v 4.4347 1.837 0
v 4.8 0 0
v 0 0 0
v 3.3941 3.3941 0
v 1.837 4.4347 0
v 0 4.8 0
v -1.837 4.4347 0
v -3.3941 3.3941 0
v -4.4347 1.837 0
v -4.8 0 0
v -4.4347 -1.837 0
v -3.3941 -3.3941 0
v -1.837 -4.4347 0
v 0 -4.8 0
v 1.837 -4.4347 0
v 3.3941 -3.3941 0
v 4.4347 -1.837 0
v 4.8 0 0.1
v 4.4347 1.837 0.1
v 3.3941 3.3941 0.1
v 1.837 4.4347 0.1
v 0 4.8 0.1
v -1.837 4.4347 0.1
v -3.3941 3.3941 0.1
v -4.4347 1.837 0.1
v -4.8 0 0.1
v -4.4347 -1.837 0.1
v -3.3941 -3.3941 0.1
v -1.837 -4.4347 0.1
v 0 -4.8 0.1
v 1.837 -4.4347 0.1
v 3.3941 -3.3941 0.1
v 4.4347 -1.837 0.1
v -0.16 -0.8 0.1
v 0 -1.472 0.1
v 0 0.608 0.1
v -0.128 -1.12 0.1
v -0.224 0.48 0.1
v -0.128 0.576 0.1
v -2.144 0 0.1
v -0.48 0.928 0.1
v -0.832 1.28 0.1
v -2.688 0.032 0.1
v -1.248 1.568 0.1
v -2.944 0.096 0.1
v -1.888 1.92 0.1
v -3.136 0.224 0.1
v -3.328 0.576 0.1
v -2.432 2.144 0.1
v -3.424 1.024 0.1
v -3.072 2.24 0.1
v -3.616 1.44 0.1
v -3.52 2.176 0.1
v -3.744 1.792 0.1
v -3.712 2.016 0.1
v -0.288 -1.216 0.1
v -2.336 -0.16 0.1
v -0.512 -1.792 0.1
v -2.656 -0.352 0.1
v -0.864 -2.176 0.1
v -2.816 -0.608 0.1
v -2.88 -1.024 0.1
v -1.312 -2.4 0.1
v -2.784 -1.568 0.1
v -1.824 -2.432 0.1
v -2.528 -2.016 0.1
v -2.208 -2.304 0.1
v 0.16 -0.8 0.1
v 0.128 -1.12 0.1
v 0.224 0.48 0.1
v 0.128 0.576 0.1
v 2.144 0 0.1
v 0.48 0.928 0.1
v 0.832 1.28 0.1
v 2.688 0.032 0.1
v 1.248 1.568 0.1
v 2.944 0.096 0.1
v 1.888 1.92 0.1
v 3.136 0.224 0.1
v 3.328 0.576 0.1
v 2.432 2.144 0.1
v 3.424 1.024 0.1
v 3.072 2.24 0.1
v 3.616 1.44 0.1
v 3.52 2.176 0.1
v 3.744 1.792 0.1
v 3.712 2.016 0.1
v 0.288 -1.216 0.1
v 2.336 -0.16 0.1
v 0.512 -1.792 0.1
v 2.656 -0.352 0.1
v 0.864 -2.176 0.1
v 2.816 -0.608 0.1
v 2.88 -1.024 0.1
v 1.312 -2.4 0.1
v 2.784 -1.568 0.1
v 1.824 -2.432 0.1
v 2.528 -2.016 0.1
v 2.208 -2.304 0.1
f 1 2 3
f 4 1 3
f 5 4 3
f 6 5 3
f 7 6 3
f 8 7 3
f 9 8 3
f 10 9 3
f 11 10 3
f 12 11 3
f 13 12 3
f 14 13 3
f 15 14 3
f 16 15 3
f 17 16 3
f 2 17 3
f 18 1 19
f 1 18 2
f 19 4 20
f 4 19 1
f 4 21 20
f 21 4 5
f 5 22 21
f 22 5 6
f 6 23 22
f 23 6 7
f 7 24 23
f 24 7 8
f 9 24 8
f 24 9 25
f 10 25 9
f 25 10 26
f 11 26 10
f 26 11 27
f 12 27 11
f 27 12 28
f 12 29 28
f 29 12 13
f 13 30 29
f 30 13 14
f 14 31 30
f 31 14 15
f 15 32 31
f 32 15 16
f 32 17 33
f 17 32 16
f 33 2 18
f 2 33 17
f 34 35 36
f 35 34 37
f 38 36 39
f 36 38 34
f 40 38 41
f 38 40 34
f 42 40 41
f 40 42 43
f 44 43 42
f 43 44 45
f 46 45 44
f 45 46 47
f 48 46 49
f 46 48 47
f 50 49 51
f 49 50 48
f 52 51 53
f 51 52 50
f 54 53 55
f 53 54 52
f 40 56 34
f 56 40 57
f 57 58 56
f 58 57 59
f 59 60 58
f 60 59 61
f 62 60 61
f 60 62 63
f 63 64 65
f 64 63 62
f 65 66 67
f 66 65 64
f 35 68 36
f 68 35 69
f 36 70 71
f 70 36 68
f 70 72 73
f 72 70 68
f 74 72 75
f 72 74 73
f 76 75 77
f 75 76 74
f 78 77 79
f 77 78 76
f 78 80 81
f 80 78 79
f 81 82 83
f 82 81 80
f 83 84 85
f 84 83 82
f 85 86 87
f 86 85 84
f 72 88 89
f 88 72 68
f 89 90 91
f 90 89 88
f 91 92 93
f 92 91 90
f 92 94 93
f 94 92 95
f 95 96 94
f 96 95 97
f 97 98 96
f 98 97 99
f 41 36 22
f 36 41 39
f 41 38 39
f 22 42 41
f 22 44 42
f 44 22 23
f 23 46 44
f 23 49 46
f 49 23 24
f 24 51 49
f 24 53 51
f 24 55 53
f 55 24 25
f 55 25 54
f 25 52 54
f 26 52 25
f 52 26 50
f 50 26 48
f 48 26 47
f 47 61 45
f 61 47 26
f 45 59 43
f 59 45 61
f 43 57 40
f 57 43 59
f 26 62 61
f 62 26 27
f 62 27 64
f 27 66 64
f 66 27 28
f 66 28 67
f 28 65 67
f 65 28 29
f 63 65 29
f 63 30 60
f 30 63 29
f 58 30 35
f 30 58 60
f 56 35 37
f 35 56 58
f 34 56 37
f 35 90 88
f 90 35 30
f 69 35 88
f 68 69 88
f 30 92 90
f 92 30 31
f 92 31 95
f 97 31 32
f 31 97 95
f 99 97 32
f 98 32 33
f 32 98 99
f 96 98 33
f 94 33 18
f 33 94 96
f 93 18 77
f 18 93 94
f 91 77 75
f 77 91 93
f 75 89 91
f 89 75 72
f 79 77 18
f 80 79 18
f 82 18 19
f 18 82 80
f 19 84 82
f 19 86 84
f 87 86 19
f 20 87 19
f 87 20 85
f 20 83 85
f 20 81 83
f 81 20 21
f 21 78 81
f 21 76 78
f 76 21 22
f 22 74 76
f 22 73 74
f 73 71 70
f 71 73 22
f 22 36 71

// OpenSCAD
// file: ../p/empty.scad
use <../lib.scad>
function ldraw_lib__empty() = [
// 0 Empty
// 0 Name: empty.dat
// 0 Author: Steffen [Steffen]
// 0 !LDRAW_ORG Primitive UPDATE 2015-01
// 0 !LICENSE Licensed under CC BY 4.0 : see CAreadme.txt
// 
// 0 BFC CERTIFY CCW
  [0,"BFC","CERTIFY"],
  [0,"BFC","CCW"],
// 
// 0 !HISTORY 2015-10-11 [PTadmin] Official Update 2015-01
// 
// 
// 0 // Tool MLCad cannot handle really empty files. This file is used as a workaround.
// 0 // It exceptionally contains forbidden non-LDRAW standard syntax to satisfy MLCad until it is fixed OR a different editor has become the de-facto LDRAW standard.
// 0 // The line being used here is an "impossible" conditional line which never should be visible,
// 0 // additionally hidden by a syntax explicitly hiding it from displaying.
// 
// 0 MLCAD HIDE 5 24 0 0 0 0.0001 0 0 0.0001 -0.0001 0 0 0 0
];
module ldraw_lib__empty(step=0, col=false, unit=2/5, alt=false, line=0.2, solid=!$preview)
    makepoly(ldraw_lib__empty(), step=step, col=col, unit=unit, alt=alt, line=line, solid=solid);
ldraw_lib__empty(line=0.2);
// file: ../p/1-16chrd.scad
use <../lib.scad>
use <empty.scad>
function ldraw_lib__1_16chrd() = [
// 0 Chord 0.0625
// 0 Name: 1-16chrd.dat
// 0 Author: Philippe Hurbain [Philo]
// 0 !LDRAW_ORG Primitive UPDATE 2015-01
// 0 !LICENSE Licensed under CC BY 4.0 : see CAreadme.txt
// 
// 0 BFC CERTIFY CCW
  [0,"BFC","CERTIFY"],
  [0,"BFC","CCW"],
// 
// 0 !HISTORY 2015-10-11 [PTadmin] Official Update 2015-01
// 
// 
// 0 // This file is intentionally empty because at the current \P resolution,
// 0 // an 1-16chrd is actually empty. However, this file still is present
// 0 // to allow tools to do primitives substition and fill in a real chrd here,
// 0 // or, if desired, to substitute this with the hi-res 48\1-16chrd.
// 
// 0 // This file is based on an idea by Darats at http://forums.ldraw.org/read.php?19,14500,14500#msg-14500
// 
// 1 16 0 0 0 1 0 0 0 1 0 0 0 1 empty.dat
  [1,16,0,0,0,1,0,0,0,1,0,0,0,1, ldraw_lib__empty()],
];
module ldraw_lib__1_16chrd(step=0, col=false, unit=2/5, alt=false, line=0.2, solid=!$preview)
    makepoly(ldraw_lib__1_16chrd(), step=step, col=col, unit=unit, alt=alt, line=line, solid=solid);
ldraw_lib__1_16chrd(line=0.2);
// file: ../p/4-4ering.scad
use <../lib.scad>
use <1-16chrd.scad>
function ldraw_lib__4_4ering() = [
// 0 Adapter Ring Triangles to Normal 1.0
// 0 Name: 4-4ering.dat
// 0 Author: Philippe Hurbain [Philo]
// 0 !LDRAW_ORG Primitive UPDATE 2015-01
// 0 !LICENSE Licensed under CC BY 4.0 : see CAreadme.txt
// 
// 0 BFC CERTIFY CCW
  [0,"BFC","CERTIFY"],
  [0,"BFC","CCW"],
// 
// 0 !HISTORY 2015-10-11 [PTadmin] Official Update 2015-01
// 
// 
// 0 // This file uses 1-16chrd (actually empty). It allows
// 0 // tools to do primitives substition and fill in a ring of chrd here,
// 0 // or, if desired, to substitute this with the hi-res 48\1-16chrd.
// 0 // This file is based on an idea by Darats at http://forums.ldraw.org/read.php?19,14500,14500#msg-14500
// 
// 1 16 0 0 0 1 0 0 0 1 0 0 0 1 1-16chrd.dat
  [1,16,0,0,0,1,0,0,0,1,0,0,0,1, ldraw_lib__1_16chrd()],
// 1 16 0 0 0 0.92388 0 0.38268 0 1 0 -0.38268 0 0.92388 1-16chrd.dat
  [1,16,0,0,0,0.92388,0,0.38268,0,1,0,-0.38268,0,0.92388, ldraw_lib__1_16chrd()],
// 1 16 0 0 0 0.70711 0 0.70711 0 1 0 -0.70711 0 0.70711 1-16chrd.dat
  [1,16,0,0,0,0.70711,0,0.70711,0,1,0,-0.70711,0,0.70711, ldraw_lib__1_16chrd()],
// 1 16 0 0 0 0.38268 0 0.92388 0 1 0 -0.92388 0 0.38268 1-16chrd.dat
  [1,16,0,0,0,0.38268,0,0.92388,0,1,0,-0.92388,0,0.38268, ldraw_lib__1_16chrd()],
// 1 16 0 0 0 0 0 1 0 1 0 -1 0 0 1-16chrd.dat
  [1,16,0,0,0,0,0,1,0,1,0,-1,0,0, ldraw_lib__1_16chrd()],
// 1 16 0 0 0 -0.38268 0 0.92388 0 1 0 -0.92388 0 -0.38268 1-16chrd.dat
  [1,16,0,0,0,-0.38268,0,0.92388,0,1,0,-0.92388,0,-0.38268, ldraw_lib__1_16chrd()],
// 1 16 0 0 0 -0.70711 0 0.70711 0 1 0 -0.70711 0 -0.70711 1-16chrd.dat
  [1,16,0,0,0,-0.70711,0,0.70711,0,1,0,-0.70711,0,-0.70711, ldraw_lib__1_16chrd()],
// 1 16 0 0 0 -0.92388 0 0.38268 0 1 0 -0.38268 0 -0.92388 1-16chrd.dat
  [1,16,0,0,0,-0.92388,0,0.38268,0,1,0,-0.38268,0,-0.92388, ldraw_lib__1_16chrd()],
// 1 16 0 0 0 0 0 -1 0 1 0 1 0 0 1-16chrd.dat
  [1,16,0,0,0,0,0,-1,0,1,0,1,0,0, ldraw_lib__1_16chrd()],
// 1 16 0 0 0 0.38268 0 -0.92388 0 1 0 0.92388 0 0.38268 1-16chrd.dat
  [1,16,0,0,0,0.38268,0,-0.92388,0,1,0,0.92388,0,0.38268, ldraw_lib__1_16chrd()],
// 1 16 0 0 0 0.70711 0 -0.70711 0 1 0 0.70711 0 0.70711 1-16chrd.dat
  [1,16,0,0,0,0.70711,0,-0.70711,0,1,0,0.70711,0,0.70711, ldraw_lib__1_16chrd()],
// 1 16 0 0 0 0.92388 0 -0.38268 0 1 0 0.38268 0 0.92388 1-16chrd.dat
  [1,16,0,0,0,0.92388,0,-0.38268,0,1,0,0.38268,0,0.92388, ldraw_lib__1_16chrd()],
// 1 16 0 0 0 -1 0 0 0 1 0 0 0 -1 1-16chrd.dat
  [1,16,0,0,0,-1,0,0,0,1,0,0,0,-1, ldraw_lib__1_16chrd()],
// 1 16 0 0 0 -0.92388 0 -0.38268 0 1 0 0.38268 0 -0.92388 1-16chrd.dat
  [1,16,0,0,0,-0.92388,0,-0.38268,0,1,0,0.38268,0,-0.92388, ldraw_lib__1_16chrd()],
// 1 16 0 0 0 -0.70711 0 -0.70711 0 1 0 0.70711 0 -0.70711 1-16chrd.dat
  [1,16,0,0,0,-0.70711,0,-0.70711,0,1,0,0.70711,0,-0.70711, ldraw_lib__1_16chrd()],
// 1 16 0 0 0 -0.38268 0 -0.92388 0 1 0 0.92388 0 -0.38268 1-16chrd.dat
  [1,16,0,0,0,-0.38268,0,-0.92388,0,1,0,0.92388,0,-0.38268, ldraw_lib__1_16chrd()],
];
module ldraw_lib__4_4ering(step=0, col=false, unit=2/5, alt=false, line=0.2, solid=!$preview)
    makepoly(ldraw_lib__4_4ering(), step=step, col=col, unit=unit, alt=alt, line=line, solid=solid);
ldraw_lib__4_4ering(line=0.2);
// file: ../p/4-4disc.scad
use <../lib.scad>
function ldraw_lib__4_4disc() = [
// 0 Disc 1.0
// 0 Name: 4-4disc.dat
// 0 Author: James Jessiman
// 0 !LDRAW_ORG Primitive UPDATE 2002-02
// 0 !LICENSE Licensed under CC BY 4.0 : see CAreadme.txt
// 
// 0 BFC CERTIFY CCW
  [0,"BFC","CERTIFY"],
  [0,"BFC","CCW"],
// 
// 0 !HISTORY 1998-12-15 [PTadmin] Official Update 1998-10
// 0 !HISTORY 2002-03-23 [sbliss] Added BFC statement
// 0 !HISTORY 2002-04-25 [PTadmin] Official Update 2002-02
// 0 !HISTORY 2007-06-24 [PTadmin] Header formatted for Contributor Agreement
// 0 !HISTORY 2008-07-01 [PTadmin] Official Update 2008-01
// 
// 
// 3 16 0 0 0 1 0 0 0.9239 0 0.3827
  [3,16,0,0,0,1,0,0,0.9239,0,0.3827],
// 3 16 0 0 0 0.9239 0 0.3827 0.7071 0 0.7071
  [3,16,0,0,0,0.9239,0,0.3827,0.7071,0,0.7071],
// 3 16 0 0 0 0.7071 0 0.7071 0.3827 0 0.9239
  [3,16,0,0,0,0.7071,0,0.7071,0.3827,0,0.9239],
// 3 16 0 0 0 0.3827 0 0.9239 0 0 1
  [3,16,0,0,0,0.3827,0,0.9239,0,0,1],
// 3 16 0 0 0 0 0 1 -0.3827 0 0.9239
  [3,16,0,0,0,0,0,1,-0.3827,0,0.9239],
// 3 16 0 0 0 -0.3827 0 0.9239 -0.7071 0 0.7071
  [3,16,0,0,0,-0.3827,0,0.9239,-0.7071,0,0.7071],
// 3 16 0 0 0 -0.7071 0 0.7071 -0.9239 0 0.3827
  [3,16,0,0,0,-0.7071,0,0.7071,-0.9239,0,0.3827],
// 3 16 0 0 0 -0.9239 0 0.3827 -1 0 -0
  [3,16,0,0,0,-0.9239,0,0.3827,-1,0,-0],
// 3 16 0 0 0 -1 0 -0 -0.9239 0 -0.3827
  [3,16,0,0,0,-1,0,-0,-0.9239,0,-0.3827],
// 3 16 0 0 0 -0.9239 0 -0.3827 -0.7071 0 -0.7071
  [3,16,0,0,0,-0.9239,0,-0.3827,-0.7071,0,-0.7071],
// 3 16 0 0 0 -0.7071 0 -0.7071 -0.3827 0 -0.9239
  [3,16,0,0,0,-0.7071,0,-0.7071,-0.3827,0,-0.9239],
// 3 16 0 0 0 -0.3827 0 -0.9239 0 0 -1
  [3,16,0,0,0,-0.3827,0,-0.9239,0,0,-1],
// 3 16 0 0 0 0 0 -1 0.3827 0 -0.9239
  [3,16,0,0,0,0,0,-1,0.3827,0,-0.9239],
// 3 16 0 0 0 0.3827 0 -0.9239 0.7071 0 -0.7071
  [3,16,0,0,0,0.3827,0,-0.9239,0.7071,0,-0.7071],
// 3 16 0 0 0 0.7071 0 -0.7071 0.9239 0 -0.3827
  [3,16,0,0,0,0.7071,0,-0.7071,0.9239,0,-0.3827],
// 3 16 0 0 0 0.9239 0 -0.3827 1 0 0
  [3,16,0,0,0,0.9239,0,-0.3827,1,0,0],
// 0
];
module ldraw_lib__4_4disc(step=0, col=false, unit=2/5, alt=false, line=0.2, solid=!$preview)
    makepoly(ldraw_lib__4_4disc(), step=step, col=col, unit=unit, alt=alt, line=line, solid=solid);
ldraw_lib__4_4disc(line=0.2);
// file: ../p/4-4cyli.scad
use <../lib.scad>
function ldraw_lib__4_4cyli() = [
// 0 Cylinder 1.0
// 0 Name: 4-4cyli.dat
// 0 Author: James Jessiman
// 0 !LDRAW_ORG Primitive UPDATE 2005-01
// 0 !LICENSE Licensed under CC BY 4.0 : see CAreadme.txt
// 
// 0 BFC CERTIFY CCW
  [0,"BFC","CERTIFY"],
  [0,"BFC","CCW"],
// 
// 0 !HISTORY 1998-12-15 [PTadmin] Official Update 1998-10
// 0 !HISTORY 2002-03-23 [sbliss] Added BFC statement; merged headers from files in distributions LDraw 0.27 and Complete.
// 0 !HISTORY 2002-04-25 [PTadmin] Official Update 2002-02
// 0 !HISTORY 2004-12-14 [guyvivan] BFC CCW
// 0 !HISTORY 2005-12-28 [PTadmin] Official Update 2005-01
// 0 !HISTORY 2007-06-24 [PTadmin] Header formatted for Contributor Agreement
// 0 !HISTORY 2008-07-01 [PTadmin] Official Update 2008-01
// 
// 
// 4 16 1 1 0 0.9239 1 0.3827 0.9239 0 0.3827 1 0 0
  [4,16,1,1,0,0.9239,1,0.3827,0.9239,0,0.3827,1,0,0],
// 5 24 1 0 0 1 1 0 0.9239 0 0.3827 0.9239 0 -0.3827
  [5,24,1,0,0,1,1,0,0.9239,0,0.3827,0.9239,0,-0.3827],
// 4 16 0.9239 1 0.3827 0.7071 1 0.7071 0.7071 0 0.7071 0.9239 0 0.3827
  [4,16,0.9239,1,0.3827,0.7071,1,0.7071,0.7071,0,0.7071,0.9239,0,0.3827],
// 5 24 0.9239 0 0.3827 0.9239 1 0.3827 0.7071 0 0.7071 1 0 0
  [5,24,0.9239,0,0.3827,0.9239,1,0.3827,0.7071,0,0.7071,1,0,0],
// 4 16 0.7071 1 0.7071 0.3827 1 0.9239 0.3827 0 0.9239 0.7071 0 0.7071
  [4,16,0.7071,1,0.7071,0.3827,1,0.9239,0.3827,0,0.9239,0.7071,0,0.7071],
// 5 24 0.7071 0 0.7071 0.7071 1 0.7071 0.3827 0 0.9239 0.9239 0 0.3827
  [5,24,0.7071,0,0.7071,0.7071,1,0.7071,0.3827,0,0.9239,0.9239,0,0.3827],
// 4 16 0.3827 1 0.9239 0 1 1 0 0 1 0.3827 0 0.9239
  [4,16,0.3827,1,0.9239,0,1,1,0,0,1,0.3827,0,0.9239],
// 5 24 0.3827 0 0.9239 0.3827 1 0.9239 0 0 1 0.7071 0 0.7071
  [5,24,0.3827,0,0.9239,0.3827,1,0.9239,0,0,1,0.7071,0,0.7071],
// 4 16 0 1 1 -0.3827 1 0.9239 -0.3827 0 0.9239 0 0 1
  [4,16,0,1,1,-0.3827,1,0.9239,-0.3827,0,0.9239,0,0,1],
// 5 24 0 0 1 0 1 1 -0.3827 0 0.9239 0.3827 0 0.9239
  [5,24,0,0,1,0,1,1,-0.3827,0,0.9239,0.3827,0,0.9239],
// 4 16 -0.3827 1 0.9239 -0.7071 1 0.7071 -0.7071 0 0.7071 -0.3827 0 0.9239
  [4,16,-0.3827,1,0.9239,-0.7071,1,0.7071,-0.7071,0,0.7071,-0.3827,0,0.9239],
// 5 24 -0.3827 0 0.9239 -0.3827 1 0.9239 -0.7071 0 0.7071 0 0 1
  [5,24,-0.3827,0,0.9239,-0.3827,1,0.9239,-0.7071,0,0.7071,0,0,1],
// 4 16 -0.7071 1 0.7071 -0.9239 1 0.3827 -0.9239 0 0.3827 -0.7071 0 0.7071
  [4,16,-0.7071,1,0.7071,-0.9239,1,0.3827,-0.9239,0,0.3827,-0.7071,0,0.7071],
// 5 24 -0.7071 0 0.7071 -0.7071 1 0.7071 -0.9239 0 0.3827 -0.3827 0 0.9239
  [5,24,-0.7071,0,0.7071,-0.7071,1,0.7071,-0.9239,0,0.3827,-0.3827,0,0.9239],
// 4 16 -0.9239 1 0.3827 -1 1 0 -1 0 0 -0.9239 0 0.3827
  [4,16,-0.9239,1,0.3827,-1,1,0,-1,0,0,-0.9239,0,0.3827],
// 5 24 -0.9239 0 0.3827 -0.9239 1 0.3827 -1 0 0 -0.7071 0 0.7071
  [5,24,-0.9239,0,0.3827,-0.9239,1,0.3827,-1,0,0,-0.7071,0,0.7071],
// 4 16 -1 1 0 -0.9239 1 -0.3827 -0.9239 0 -0.3827 -1 0 0
  [4,16,-1,1,0,-0.9239,1,-0.3827,-0.9239,0,-0.3827,-1,0,0],
// 5 24 -1 0 0 -1 1 0 -0.9239 0 -0.3827 -0.9239 0 0.3827
  [5,24,-1,0,0,-1,1,0,-0.9239,0,-0.3827,-0.9239,0,0.3827],
// 4 16 -0.9239 1 -0.3827 -0.7071 1 -0.7071 -0.7071 0 -0.7071 -0.9239 0 -0.3827
  [4,16,-0.9239,1,-0.3827,-0.7071,1,-0.7071,-0.7071,0,-0.7071,-0.9239,0,-0.3827],
// 5 24 -0.9239 0 -0.3827 -0.9239 1 -0.3827 -0.7071 0 -0.7071 -1 0 0
  [5,24,-0.9239,0,-0.3827,-0.9239,1,-0.3827,-0.7071,0,-0.7071,-1,0,0],
// 4 16 -0.7071 1 -0.7071 -0.3827 1 -0.9239 -0.3827 0 -0.9239 -0.7071 0 -0.7071
  [4,16,-0.7071,1,-0.7071,-0.3827,1,-0.9239,-0.3827,0,-0.9239,-0.7071,0,-0.7071],
// 5 24 -0.7071 0 -0.7071 -0.7071 1 -0.7071 -0.3827 0 -0.9239 -0.9239 0 -0.3827
  [5,24,-0.7071,0,-0.7071,-0.7071,1,-0.7071,-0.3827,0,-0.9239,-0.9239,0,-0.3827],
// 4 16 -0.3827 1 -0.9239 0 1 -1 0 0 -1 -0.3827 0 -0.9239
  [4,16,-0.3827,1,-0.9239,0,1,-1,0,0,-1,-0.3827,0,-0.9239],
// 5 24 -0.3827 0 -0.9239 -0.3827 1 -0.9239 0 0 -1 -0.7071 0 -0.7071
  [5,24,-0.3827,0,-0.9239,-0.3827,1,-0.9239,0,0,-1,-0.7071,0,-0.7071],
// 4 16 0 1 -1 0.3827 1 -0.9239 0.3827 0 -0.9239 0 0 -1
  [4,16,0,1,-1,0.3827,1,-0.9239,0.3827,0,-0.9239,0,0,-1],
// 5 24 0 0 -1 0 1 -1 0.3827 0 -0.9239 -0.3827 0 -0.9239
  [5,24,0,0,-1,0,1,-1,0.3827,0,-0.9239,-0.3827,0,-0.9239],
// 4 16 0.3827 1 -0.9239 0.7071 1 -0.7071 0.7071 0 -0.7071 0.3827 0 -0.9239
  [4,16,0.3827,1,-0.9239,0.7071,1,-0.7071,0.7071,0,-0.7071,0.3827,0,-0.9239],
// 5 24 0.3827 0 -0.9239 0.3827 1 -0.9239 0.7071 0 -0.7071 0 0 -1
  [5,24,0.3827,0,-0.9239,0.3827,1,-0.9239,0.7071,0,-0.7071,0,0,-1],
// 4 16 0.7071 1 -0.7071 0.9239 1 -0.3827 0.9239 0 -0.3827 0.7071 0 -0.7071
  [4,16,0.7071,1,-0.7071,0.9239,1,-0.3827,0.9239,0,-0.3827,0.7071,0,-0.7071],
// 5 24 0.7071 0 -0.7071 0.7071 1 -0.7071 0.9239 0 -0.3827 0.3827 0 -0.9239
  [5,24,0.7071,0,-0.7071,0.7071,1,-0.7071,0.9239,0,-0.3827,0.3827,0,-0.9239],
// 4 16 0.9239 1 -0.3827 1 1 0 1 0 0 0.9239 0 -0.3827
  [4,16,0.9239,1,-0.3827,1,1,0,1,0,0,0.9239,0,-0.3827],
// 5 24 0.9239 0 -0.3827 0.9239 1 -0.3827 1 0 0 0.7071 0 -0.7071
  [5,24,0.9239,0,-0.3827,0.9239,1,-0.3827,1,0,0,0.7071,0,-0.7071],
// 0
];
module ldraw_lib__4_4cyli(step=0, col=false, unit=2/5, alt=false, line=0.2, solid=!$preview)
    makepoly(ldraw_lib__4_4cyli(), step=step, col=col, unit=unit, alt=alt, line=line, solid=solid);
ldraw_lib__4_4cyli(line=0.2);
// file: s/4650854is02.scad
use <../../lib.scad>
function ldraw_lib__s__4650854is02() = [
// 0 ~Sticker  0.9 x  1.3 with Butterfly - Shape
// 0 Name: s\4650854is02.dat
// 0 Author: Takeshi Takahashi [RainbowDolphin]
// 0 !LDRAW_ORG Subpart UPDATE 2024-04
// 0 !LICENSE Licensed under CC BY 4.0 : see CAreadme.txt
// 
// 0 BFC CERTIFY CCW
  [0,"BFC","CERTIFY"],
  [0,"BFC","CCW"],
// 
// 0 !HISTORY 2024-05-28 [OrionP] Official Update 2024-04
// 
// 
// 4 16 -.5 -.25 -2.5 -.4 -.25 -3.5 0 -.25 -4.6 0 -.25 1.9
  [4,16,-.5,-.25,-2.5,-.4,-.25,-3.5,0,-.25,-4.6,0,-.25,1.9],
// 4 16 -.5 -.25 -2.5 0 -.25 1.9 -.4 -.25 1.8 -.7 -.25 1.5
  [4,16,-.5,-.25,-2.5,0,-.25,1.9,-.4,-.25,1.8,-.7,-.25,1.5],
// 4 16 -6.7 -.25 0 -.5 -.25 -2.5 -.7 -.25 1.5 -1.5 -.25 2.9
  [4,16,-6.7,-.25,0,-.5,-.25,-2.5,-.7,-.25,1.5,-1.5,-.25,2.9],
// 4 16 -8.4 -.25 .1 -6.7 -.25 0 -1.5 -.25 2.9 -2.6 -.25 4
  [4,16,-8.4,-.25,.1,-6.7,-.25,0,-1.5,-.25,2.9,-2.6,-.25,4],
// 4 16 -9.2 -.25 .3 -8.4 -.25 .1 -2.6 -.25 4 -3.9 -.25 4.9
  [4,16,-9.2,-.25,.3,-8.4,-.25,.1,-2.6,-.25,4,-3.9,-.25,4.9],
// 4 16 -9.8 -.25 .7 -9.2 -.25 .3 -3.9 -.25 4.9 -5.9 -.25 6
  [4,16,-9.8,-.25,.7,-9.2,-.25,.3,-3.9,-.25,4.9,-5.9,-.25,6],
// 4 16 -10.4 -.25 1.8 -9.8 -.25 .7 -5.9 -.25 6 -7.6 -.25 6.7
  [4,16,-10.4,-.25,1.8,-9.8,-.25,.7,-5.9,-.25,6,-7.6,-.25,6.7],
// 4 16 -10.7 -.25 3.2 -10.4 -.25 1.8 -7.6 -.25 6.7 -9.6 -.25 7
  [4,16,-10.7,-.25,3.2,-10.4,-.25,1.8,-7.6,-.25,6.7,-9.6,-.25,7],
// 4 16 -11.3 -.25 4.5 -10.7 -.25 3.2 -9.6 -.25 7 -11 -.25 6.8
  [4,16,-11.3,-.25,4.5,-10.7,-.25,3.2,-9.6,-.25,7,-11,-.25,6.8],
// 4 16 -11.7 -.25 5.6 -11.3 -.25 4.5 -11 -.25 6.8 -11.6 -.25 6.3
  [4,16,-11.7,-.25,5.6,-11.3,-.25,4.5,-11,-.25,6.8,-11.6,-.25,6.3],
// 4 16 -.5 -.25 -2.5 -6.7 -.25 0 -7.3 -.25 -.5 -.9 -.25 -3.8
  [4,16,-.5,-.25,-2.5,-6.7,-.25,0,-7.3,-.25,-.5,-.9,-.25,-3.8],
// 4 16 -.9 -.25 -3.8 -7.3 -.25 -.5 -8.3 -.25 -1.1 -1.6 -.25 -5.6
  [4,16,-.9,-.25,-3.8,-7.3,-.25,-.5,-8.3,-.25,-1.1,-1.6,-.25,-5.6],
// 4 16 -1.6 -.25 -5.6 -8.3 -.25 -1.1 -8.8 -.25 -1.9 -2.7 -.25 -6.8
  [4,16,-1.6,-.25,-5.6,-8.3,-.25,-1.1,-8.8,-.25,-1.9,-2.7,-.25,-6.8],
// 4 16 -2.7 -.25 -6.8 -8.8 -.25 -1.9 -9 -.25 -3.2 -4.1 -.25 -7.5
  [4,16,-2.7,-.25,-6.8,-8.8,-.25,-1.9,-9,-.25,-3.2,-4.1,-.25,-7.5],
// 4 16 -4.1 -.25 -7.5 -9 -.25 -3.2 -8.7 -.25 -4.9 -5.7 -.25 -7.6
  [4,16,-4.1,-.25,-7.5,-9,-.25,-3.2,-8.7,-.25,-4.9,-5.7,-.25,-7.6],
// 4 16 -5.7 -.25 -7.6 -8.7 -.25 -4.9 -7.9 -.25 -6.3 -6.9 -.25 -7.2
  [4,16,-5.7,-.25,-7.6,-8.7,-.25,-4.9,-7.9,-.25,-6.3,-6.9,-.25,-7.2],
// 4 16 0 -.25 -4.6 .4 -.25 -3.5 .5 -.25 -2.5 0 -.25 1.9
  [4,16,0,-.25,-4.6,.4,-.25,-3.5,.5,-.25,-2.5,0,-.25,1.9],
// 4 16 .4 -.25 1.8 0 -.25 1.9 .5 -.25 -2.5 .7 -.25 1.5
  [4,16,.4,-.25,1.8,0,-.25,1.9,.5,-.25,-2.5,.7,-.25,1.5],
// 4 16 .7 -.25 1.5 .5 -.25 -2.5 6.7 -.25 0 1.5 -.25 2.9
  [4,16,.7,-.25,1.5,.5,-.25,-2.5,6.7,-.25,0,1.5,-.25,2.9],
// 4 16 1.5 -.25 2.9 6.7 -.25 0 8.4 -.25 .1 2.6 -.25 4
  [4,16,1.5,-.25,2.9,6.7,-.25,0,8.4,-.25,.1,2.6,-.25,4],
// 4 16 2.6 -.25 4 8.4 -.25 .1 9.2 -.25 .3 3.9 -.25 4.9
  [4,16,2.6,-.25,4,8.4,-.25,.1,9.2,-.25,.3,3.9,-.25,4.9],
// 4 16 3.9 -.25 4.9 9.2 -.25 .3 9.8 -.25 .7 5.9 -.25 6
  [4,16,3.9,-.25,4.9,9.2,-.25,.3,9.8,-.25,.7,5.9,-.25,6],
// 4 16 5.9 -.25 6 9.8 -.25 .7 10.4 -.25 1.8 7.6 -.25 6.7
  [4,16,5.9,-.25,6,9.8,-.25,.7,10.4,-.25,1.8,7.6,-.25,6.7],
// 4 16 7.6 -.25 6.7 10.4 -.25 1.8 10.7 -.25 3.2 9.6 -.25 7
  [4,16,7.6,-.25,6.7,10.4,-.25,1.8,10.7,-.25,3.2,9.6,-.25,7],
// 4 16 9.6 -.25 7 10.7 -.25 3.2 11.3 -.25 4.5 11 -.25 6.8
  [4,16,9.6,-.25,7,10.7,-.25,3.2,11.3,-.25,4.5,11,-.25,6.8],
// 4 16 11 -.25 6.8 11.3 -.25 4.5 11.7 -.25 5.6 11.6 -.25 6.3
  [4,16,11,-.25,6.8,11.3,-.25,4.5,11.7,-.25,5.6,11.6,-.25,6.3],
// 4 16 7.3 -.25 -.5 6.7 -.25 0 .5 -.25 -2.5 .9 -.25 -3.8
  [4,16,7.3,-.25,-.5,6.7,-.25,0,.5,-.25,-2.5,.9,-.25,-3.8],
// 4 16 8.3 -.25 -1.1 7.3 -.25 -.5 .9 -.25 -3.8 1.6 -.25 -5.6
  [4,16,8.3,-.25,-1.1,7.3,-.25,-.5,.9,-.25,-3.8,1.6,-.25,-5.6],
// 4 16 8.8 -.25 -1.9 8.3 -.25 -1.1 1.6 -.25 -5.6 2.7 -.25 -6.8
  [4,16,8.8,-.25,-1.9,8.3,-.25,-1.1,1.6,-.25,-5.6,2.7,-.25,-6.8],
// 4 16 9 -.25 -3.2 8.8 -.25 -1.9 2.7 -.25 -6.8 4.1 -.25 -7.5
  [4,16,9,-.25,-3.2,8.8,-.25,-1.9,2.7,-.25,-6.8,4.1,-.25,-7.5],
// 4 16 8.7 -.25 -4.9 9 -.25 -3.2 4.1 -.25 -7.5 5.7 -.25 -7.6
  [4,16,8.7,-.25,-4.9,9,-.25,-3.2,4.1,-.25,-7.5,5.7,-.25,-7.6],
// 4 16 7.9 -.25 -6.3 8.7 -.25 -4.9 5.7 -.25 -7.6 6.9 -.25 -7.2
  [4,16,7.9,-.25,-6.3,8.7,-.25,-4.9,5.7,-.25,-7.6,6.9,-.25,-7.2],
];
module ldraw_lib__s__4650854is02(step=0, col=false, unit=2/5, alt=false, line=0.2, solid=!$preview)
    makepoly(ldraw_lib__s__4650854is02(), step=step, col=col, unit=unit, alt=alt, line=line, solid=solid);
ldraw_lib__s__4650854is02(line=0.2);
// file: s/4620860as01.scad
use <../../lib.scad>
use <../../p/4-4ering.scad>
function ldraw_lib__s__4620860as01() = [
// 0 ~Sticker  1.2 x  1.2 Round with Butterfly - Background
// 0 Name: s\4620860as01.dat
// 0 Author: Takeshi Takahashi [RainbowDolphin]
// 0 !LDRAW_ORG Subpart UPDATE 2025-01
// 0 !LICENSE Licensed under CC BY 4.0 : see CAreadme.txt
// 
// 0 BFC CERTIFY CCW
  [0,"BFC","CERTIFY"],
  [0,"BFC","CCW"],
// 
// 0 !HISTORY 2025-01-20 [OrionP] Official Update 2025-01
// 
// 
// 1 16 0 -0.25 0 12 0 0 0 1 0 0 0 12 4-4ering.dat
  [1,16,0,-0.25,0,12,0,0,0,1,0,0,0,12, ldraw_lib__4_4ering()],
// 4 16 -.32 -.25 1.44 0 -.25 1.52 0 -.25 12 -1.2 -.25 2.32
  [4,16,-.32,-.25,1.44,0,-.25,1.52,0,-.25,12,-1.2,-.25,2.32],
// 3 16 -1.2 -.25 2.32 -.56 -.25 1.2 -.32 -.25 1.44
  [3,16,-1.2,-.25,2.32,-.56,-.25,1.2,-.32,-.25,1.44],
// 3 16 0 -.25 12 -2.08 -.25 3.2 -1.2 -.25 2.32
  [3,16,0,-.25,12,-2.08,-.25,3.2,-1.2,-.25,2.32],
// 4 16 -3.12 -.25 3.92 -2.08 -.25 3.2 0 -.25 12 -4.5924 -.25 11.0868
  [4,16,-3.12,-.25,3.92,-2.08,-.25,3.2,0,-.25,12,-4.5924,-.25,11.0868],
// 3 16 -4.5924 -.25 11.0868 -4.72 -.25 4.8 -3.12 -.25 3.92
  [3,16,-4.5924,-.25,11.0868,-4.72,-.25,4.8,-3.12,-.25,3.92],
// 4 16 -6.08 -.25 5.36 -4.72 -.25 4.8 -4.5924 -.25 11.0868 -8.4852 -.25 8.4852
  [4,16,-6.08,-.25,5.36,-4.72,-.25,4.8,-4.5924,-.25,11.0868,-8.4852,-.25,8.4852],
// 3 16 -8.4852 -.25 8.4852 -7.68 -.25 5.6 -6.08 -.25 5.36
  [3,16,-8.4852,-.25,8.4852,-7.68,-.25,5.6,-6.08,-.25,5.36],
// 3 16 -8.4852 -.25 8.4852 -8.8 -.25 5.44 -7.68 -.25 5.6
  [3,16,-8.4852,-.25,8.4852,-8.8,-.25,5.44,-7.68,-.25,5.6],
// 4 16 -9.28 -.25 5.04 -8.8 -.25 5.44 -8.4852 -.25 8.4852 -11.0868 -.25 4.5924
  [4,16,-9.28,-.25,5.04,-8.8,-.25,5.44,-8.4852,-.25,8.4852,-11.0868,-.25,4.5924],
// 3 16 -9.28 -.25 5.04 -11.0868 -.25 4.5924 -9.36 -.25 4.48
  [3,16,-9.28,-.25,5.04,-11.0868,-.25,4.5924,-9.36,-.25,4.48],
// 3 16 -11.0868 -.25 4.5924 -9.04 -.25 3.6 -9.36 -.25 4.48
  [3,16,-11.0868,-.25,4.5924,-9.04,-.25,3.6,-9.36,-.25,4.48],
// 4 16 -8.56 -.25 2.56 -9.04 -.25 3.6 -11.0868 -.25 4.5924 -12 -.25 0
  [4,16,-8.56,-.25,2.56,-9.04,-.25,3.6,-11.0868,-.25,4.5924,-12,-.25,0],
// 3 16 -8.56 -.25 2.56 -12 -.25 0 -8.32 -.25 1.44
  [3,16,-8.56,-.25,2.56,-12,-.25,0,-8.32,-.25,1.44],
// 3 16 -8.32 -.25 1.44 -12 -.25 0 -7.84 -.25 .56
  [3,16,-8.32,-.25,1.44,-12,-.25,0,-7.84,-.25,.56],
// 4 16 -7.36 -.25 .24 -7.84 -.25 .56 -12 -.25 0 -7.04 -.25 -1.52
  [4,16,-7.36,-.25,.24,-7.84,-.25,.56,-12,-.25,0,-7.04,-.25,-1.52],
// 4 16 -7.36 -.25 .24 -7.04 -.25 -1.52 -6.64 -.25 -.88 -6.72 -.25 .08
  [4,16,-7.36,-.25,.24,-7.04,-.25,-1.52,-6.64,-.25,-.88,-6.72,-.25,.08],
// 4 16 -6.72 -.25 .08 -6.64 -.25 -.88 -5.84 -.25 -.4 -5.36 -.25 0
  [4,16,-6.72,-.25,.08,-6.64,-.25,-.88,-5.84,-.25,-.4,-5.36,-.25,0],
// 4 16 -7.2 -.25 -2.56 -7.04 -.25 -1.52 -12 -.25 0 -11.0868 -.25 -4.5924
  [4,16,-7.2,-.25,-2.56,-7.04,-.25,-1.52,-12,-.25,0,-11.0868,-.25,-4.5924],
// 3 16 -7.2 -.25 -2.56 -11.0868 -.25 -4.5924 -6.96 -.25 -3.92
  [3,16,-7.2,-.25,-2.56,-11.0868,-.25,-4.5924,-6.96,-.25,-3.92],
// 4 16 -6.32 -.25 -5.04 -6.96 -.25 -3.92 -11.0868 -.25 -4.5924 -8.4852 -.25 -8.4852
  [4,16,-6.32,-.25,-5.04,-6.96,-.25,-3.92,-11.0868,-.25,-4.5924,-8.4852,-.25,-8.4852],
// 3 16 -6.32 -.25 -5.04 -8.4852 -.25 -8.4852 -5.52 -.25 -5.76
  [3,16,-6.32,-.25,-5.04,-8.4852,-.25,-8.4852,-5.52,-.25,-5.76],
// 4 16 -4.56 -.25 -6.08 -5.52 -.25 -5.76 -8.4852 -.25 -8.4852 -4.5924 -.25 -11.0868
  [4,16,-4.56,-.25,-6.08,-5.52,-.25,-5.76,-8.4852,-.25,-8.4852,-4.5924,-.25,-11.0868],
// 3 16 -3.28 -.25 -6 -4.56 -.25 -6.08 -4.5924 -.25 -11.0868
  [3,16,-3.28,-.25,-6,-4.56,-.25,-6.08,-4.5924,-.25,-11.0868],
// 4 16 -2.16 -.25 -5.44 -3.28 -.25 -6 -4.5924 -.25 -11.0868 0 -.25 -12
  [4,16,-2.16,-.25,-5.44,-3.28,-.25,-6,-4.5924,-.25,-11.0868,0,-.25,-12],
// 4 16 -1.28 -.25 -4.48 -2.16 -.25 -5.44 0 -.25 -12 0 -.25 -3.68
  [4,16,-1.28,-.25,-4.48,-2.16,-.25,-5.44,0,-.25,-12,0,-.25,-3.68],
// 4 16 -.72 -.25 -3.04 -1.28 -.25 -4.48 0 -.25 -3.68 -.32 -.25 -2.8
  [4,16,-.72,-.25,-3.04,-1.28,-.25,-4.48,0,-.25,-3.68,-.32,-.25,-2.8],
// 3 16 -.4 -.25 -2 -.72 -.25 -3.04 -.32 -.25 -2.8
  [3,16,-.4,-.25,-2,-.72,-.25,-3.04,-.32,-.25,-2.8],
// 4 16 0 -.25 -3.68 0 -.25 -12 1.28 -.25 -4.48 .72 -.25 -3.04
  [4,16,0,-.25,-3.68,0,-.25,-12,1.28,-.25,-4.48,.72,-.25,-3.04],
// 3 16 .32 -.25 -2.8 0 -.25 -3.68 .72 -.25 -3.04
  [3,16,.32,-.25,-2.8,0,-.25,-3.68,.72,-.25,-3.04],
// 3 16 .4 -.25 -2 .32 -.25 -2.8 .72 -.25 -3.04
  [3,16,.4,-.25,-2,.32,-.25,-2.8,.72,-.25,-3.04],
// 4 16 2.16 -.25 -5.44 1.28 -.25 -4.48 0 -.25 -12 4.5924 -.25 -11.0868
  [4,16,2.16,-.25,-5.44,1.28,-.25,-4.48,0,-.25,-12,4.5924,-.25,-11.0868],
// 3 16 2.16 -.25 -5.44 4.5924 -.25 -11.0868 3.28 -.25 -6
  [3,16,2.16,-.25,-5.44,4.5924,-.25,-11.0868,3.28,-.25,-6],
// 4 16 4.56 -.25 -6.08 3.28 -.25 -6 4.5924 -.25 -11.0868 8.4852 -.25 -8.4852
  [4,16,4.56,-.25,-6.08,3.28,-.25,-6,4.5924,-.25,-11.0868,8.4852,-.25,-8.4852],
// 3 16 5.52 -.25 -5.76 4.56 -.25 -6.08 8.4852 -.25 -8.4852
  [3,16,5.52,-.25,-5.76,4.56,-.25,-6.08,8.4852,-.25,-8.4852],
// 4 16 6.32 -.25 -5.04 5.52 -.25 -5.76 8.4852 -.25 -8.4852 11.0868 -.25 -4.5924
  [4,16,6.32,-.25,-5.04,5.52,-.25,-5.76,8.4852,-.25,-8.4852,11.0868,-.25,-4.5924],
// 3 16 6.96 -.25 -3.92 6.32 -.25 -5.04 11.0868 -.25 -4.5924
  [3,16,6.96,-.25,-3.92,6.32,-.25,-5.04,11.0868,-.25,-4.5924],
// 4 16 7.2 -.25 -2.56 6.96 -.25 -3.92 11.0868 -.25 -4.5924 12 -.25 0
  [4,16,7.2,-.25,-2.56,6.96,-.25,-3.92,11.0868,-.25,-4.5924,12,-.25,0],
// 4 16 7.04 -.25 -1.52 7.2 -.25 -2.56 12 -.25 0 7.36 -.25 .24
  [4,16,7.04,-.25,-1.52,7.2,-.25,-2.56,12,-.25,0,7.36,-.25,.24],
// 4 16 6.64 -.25 -.88 7.04 -.25 -1.52 7.36 -.25 .24 6.72 -.25 .08
  [4,16,6.64,-.25,-.88,7.04,-.25,-1.52,7.36,-.25,.24,6.72,-.25,.08],
// 4 16 5.84 -.25 -.4 6.64 -.25 -.88 6.72 -.25 .08 5.36 -.25 0
  [4,16,5.84,-.25,-.4,6.64,-.25,-.88,6.72,-.25,.08,5.36,-.25,0],
// 3 16 7.84 -.25 .56 7.36 -.25 .24 12 -.25 0
  [3,16,7.84,-.25,.56,7.36,-.25,.24,12,-.25,0],
// 3 16 8.32 -.25 1.44 7.84 -.25 .56 12 -.25 0
  [3,16,8.32,-.25,1.44,7.84,-.25,.56,12,-.25,0],
// 4 16 8.56 -.25 2.56 8.32 -.25 1.44 12 -.25 0 11.0868 -.25 4.5924
  [4,16,8.56,-.25,2.56,8.32,-.25,1.44,12,-.25,0,11.0868,-.25,4.5924],
// 3 16 11.0868 -.25 4.5924 9.04 -.25 3.6 8.56 -.25 2.56
  [3,16,11.0868,-.25,4.5924,9.04,-.25,3.6,8.56,-.25,2.56],
// 3 16 11.0868 -.25 4.5924 9.36 -.25 4.48 9.04 -.25 3.6
  [3,16,11.0868,-.25,4.5924,9.36,-.25,4.48,9.04,-.25,3.6],
// 3 16 9.28 -.25 5.04 9.36 -.25 4.48 11.0868 -.25 4.5924
  [3,16,9.28,-.25,5.04,9.36,-.25,4.48,11.0868,-.25,4.5924],
// 4 16 9.28 -.25 5.04 11.0868 -.25 4.5924 8.4852 -.25 8.4852 8.8 -.25 5.44
  [4,16,9.28,-.25,5.04,11.0868,-.25,4.5924,8.4852,-.25,8.4852,8.8,-.25,5.44],
// 3 16 8.4852 -.25 8.4852 7.68 -.25 5.6 8.8 -.25 5.44
  [3,16,8.4852,-.25,8.4852,7.68,-.25,5.6,8.8,-.25,5.44],
// 4 16 6.08 -.25 5.36 7.68 -.25 5.6 8.4852 -.25 8.4852 4.5924 -.25 11.0868
  [4,16,6.08,-.25,5.36,7.68,-.25,5.6,8.4852,-.25,8.4852,4.5924,-.25,11.0868],
// 3 16 4.5924 -.25 11.0868 4.72 -.25 4.8 6.08 -.25 5.36
  [3,16,4.5924,-.25,11.0868,4.72,-.25,4.8,6.08,-.25,5.36],
// 4 16 3.12 -.25 3.92 4.72 -.25 4.8 4.5924 -.25 11.0868 0 -.25 12
  [4,16,3.12,-.25,3.92,4.72,-.25,4.8,4.5924,-.25,11.0868,0,-.25,12],
// 3 16 0 -.25 12 2.08 -.25 3.2 3.12 -.25 3.92
  [3,16,0,-.25,12,2.08,-.25,3.2,3.12,-.25,3.92],
// 3 16 0 -.25 12 1.2 -.25 2.32 2.08 -.25 3.2
  [3,16,0,-.25,12,1.2,-.25,2.32,2.08,-.25,3.2],
// 4 16 1.2 -.25 2.32 0 -.25 12 .32 -.25 1.44 .56 -.25 1.2
  [4,16,1.2,-.25,2.32,0,-.25,12,.32,-.25,1.44,.56,-.25,1.2],
// 3 16 0 -.25 12 0 -.25 1.52 .32 -.25 1.44
  [3,16,0,-.25,12,0,-.25,1.52,.32,-.25,1.44],
];
module ldraw_lib__s__4620860as01(step=0, col=false, unit=2/5, alt=false, line=0.2, solid=!$preview)
    makepoly(ldraw_lib__s__4620860as01(), step=step, col=col, unit=unit, alt=alt, line=line, solid=solid);
ldraw_lib__s__4620860as01(line=0.2);
// file: ../p/4-4cylc3.scad
use <../lib.scad>
use <4-4cyli.scad>
use <4-4disc.scad>
function ldraw_lib__4_4cylc3() = [
// 0 Cylinder Closed 1.0 without Top or Bottom Edge Lines
// 0 Name: 4-4cylc3.dat
// 0 Author: Chris Dee [cwdee]
// 0 !LDRAW_ORG Primitive UPDATE 2017-01
// 0 !LICENSE Licensed under CC BY 4.0 : see CAreadme.txt
// 
// 0 BFC CERTIFY CCW
  [0,"BFC","CERTIFY"],
  [0,"BFC","CCW"],
// 
// 0 !HISTORY 2017-12-30 [PTadmin] Official Update 2017-01
// 
// 
// 1 16 0 0 0 1 0 0 0 1 0 0 0 1 4-4disc.dat
  [1,16,0,0,0,1,0,0,0,1,0,0,0,1, ldraw_lib__4_4disc()],
// 1 16 0 0 0 1 0 0 0 1 0 0 0 1 4-4cyli.dat
  [1,16,0,0,0,1,0,0,0,1,0,0,0,1, ldraw_lib__4_4cyli()],
// 0
];
module ldraw_lib__4_4cylc3(step=0, col=false, unit=2/5, alt=false, line=0.2, solid=!$preview)
    makepoly(ldraw_lib__4_4cylc3(), step=step, col=col, unit=unit, alt=alt, line=line, solid=solid);
ldraw_lib__4_4cylc3(line=0.2);
// main file
use <../lib.scad>
use <../p/4-4cylc3.scad>
use <s/4620860as01.scad>
use <s/4650854is02.scad>
function ldraw_lib__4620860j() = [
// 0 Sticker  1.2 x  1.2 Round with Dark Pink Butterfly on Tan Background
// 0 Name: 4620860j.dat
// 0 Author: Takeshi Takahashi [RainbowDolphin]
// 0 !LDRAW_ORG Part UPDATE 2025-01
// 0 !LICENSE Licensed under CC BY 4.0 : see CAreadme.txt
// 
// 0 BFC CERTIFY CCW
  [0,"BFC","CERTIFY"],
  [0,"BFC","CCW"],
// 
// 0 !KEYWORDS Bricklink 3315stk01, Brickowl 604777, house, Olivia
// 0 !KEYWORDS Rebrickable 95460, set 3315
// 
// 0 !HISTORY 2025-01-20 [OrionP] Official Update 2025-01
// 
// 
// 1 16 0 0 0 12 0 0 0 -0.25 0 0 0 12 4-4cylc3.dat
  [1,16,0,0,0,12,0,0,0,-0.25,0,0,0,12, ldraw_lib__4_4cylc3()],
// 1 5 0 0 0 0.8 0 0 0 1 0 0 0 0.8 s\4650854is02.dat
  [1,5,0,0,0,0.8,0,0,0,1,0,0,0,0.8, ldraw_lib__s__4650854is02()],
// 1 19 0 0 0 1 0 0 0 1 0 0 0 1 s\4620860as01.dat
  [1,19,0,0,0,1,0,0,0,1,0,0,0,1, ldraw_lib__s__4620860as01()],
];
module ldraw_lib__4620860j(step=0, col=false, unit=2/5, alt=false, line=0.2, solid=!$preview)
    makepoly(ldraw_lib__4620860j(), step=step, col=col, unit=unit, alt=alt, line=line, solid=solid);
ldraw_lib__4620860j(line=0.2);
